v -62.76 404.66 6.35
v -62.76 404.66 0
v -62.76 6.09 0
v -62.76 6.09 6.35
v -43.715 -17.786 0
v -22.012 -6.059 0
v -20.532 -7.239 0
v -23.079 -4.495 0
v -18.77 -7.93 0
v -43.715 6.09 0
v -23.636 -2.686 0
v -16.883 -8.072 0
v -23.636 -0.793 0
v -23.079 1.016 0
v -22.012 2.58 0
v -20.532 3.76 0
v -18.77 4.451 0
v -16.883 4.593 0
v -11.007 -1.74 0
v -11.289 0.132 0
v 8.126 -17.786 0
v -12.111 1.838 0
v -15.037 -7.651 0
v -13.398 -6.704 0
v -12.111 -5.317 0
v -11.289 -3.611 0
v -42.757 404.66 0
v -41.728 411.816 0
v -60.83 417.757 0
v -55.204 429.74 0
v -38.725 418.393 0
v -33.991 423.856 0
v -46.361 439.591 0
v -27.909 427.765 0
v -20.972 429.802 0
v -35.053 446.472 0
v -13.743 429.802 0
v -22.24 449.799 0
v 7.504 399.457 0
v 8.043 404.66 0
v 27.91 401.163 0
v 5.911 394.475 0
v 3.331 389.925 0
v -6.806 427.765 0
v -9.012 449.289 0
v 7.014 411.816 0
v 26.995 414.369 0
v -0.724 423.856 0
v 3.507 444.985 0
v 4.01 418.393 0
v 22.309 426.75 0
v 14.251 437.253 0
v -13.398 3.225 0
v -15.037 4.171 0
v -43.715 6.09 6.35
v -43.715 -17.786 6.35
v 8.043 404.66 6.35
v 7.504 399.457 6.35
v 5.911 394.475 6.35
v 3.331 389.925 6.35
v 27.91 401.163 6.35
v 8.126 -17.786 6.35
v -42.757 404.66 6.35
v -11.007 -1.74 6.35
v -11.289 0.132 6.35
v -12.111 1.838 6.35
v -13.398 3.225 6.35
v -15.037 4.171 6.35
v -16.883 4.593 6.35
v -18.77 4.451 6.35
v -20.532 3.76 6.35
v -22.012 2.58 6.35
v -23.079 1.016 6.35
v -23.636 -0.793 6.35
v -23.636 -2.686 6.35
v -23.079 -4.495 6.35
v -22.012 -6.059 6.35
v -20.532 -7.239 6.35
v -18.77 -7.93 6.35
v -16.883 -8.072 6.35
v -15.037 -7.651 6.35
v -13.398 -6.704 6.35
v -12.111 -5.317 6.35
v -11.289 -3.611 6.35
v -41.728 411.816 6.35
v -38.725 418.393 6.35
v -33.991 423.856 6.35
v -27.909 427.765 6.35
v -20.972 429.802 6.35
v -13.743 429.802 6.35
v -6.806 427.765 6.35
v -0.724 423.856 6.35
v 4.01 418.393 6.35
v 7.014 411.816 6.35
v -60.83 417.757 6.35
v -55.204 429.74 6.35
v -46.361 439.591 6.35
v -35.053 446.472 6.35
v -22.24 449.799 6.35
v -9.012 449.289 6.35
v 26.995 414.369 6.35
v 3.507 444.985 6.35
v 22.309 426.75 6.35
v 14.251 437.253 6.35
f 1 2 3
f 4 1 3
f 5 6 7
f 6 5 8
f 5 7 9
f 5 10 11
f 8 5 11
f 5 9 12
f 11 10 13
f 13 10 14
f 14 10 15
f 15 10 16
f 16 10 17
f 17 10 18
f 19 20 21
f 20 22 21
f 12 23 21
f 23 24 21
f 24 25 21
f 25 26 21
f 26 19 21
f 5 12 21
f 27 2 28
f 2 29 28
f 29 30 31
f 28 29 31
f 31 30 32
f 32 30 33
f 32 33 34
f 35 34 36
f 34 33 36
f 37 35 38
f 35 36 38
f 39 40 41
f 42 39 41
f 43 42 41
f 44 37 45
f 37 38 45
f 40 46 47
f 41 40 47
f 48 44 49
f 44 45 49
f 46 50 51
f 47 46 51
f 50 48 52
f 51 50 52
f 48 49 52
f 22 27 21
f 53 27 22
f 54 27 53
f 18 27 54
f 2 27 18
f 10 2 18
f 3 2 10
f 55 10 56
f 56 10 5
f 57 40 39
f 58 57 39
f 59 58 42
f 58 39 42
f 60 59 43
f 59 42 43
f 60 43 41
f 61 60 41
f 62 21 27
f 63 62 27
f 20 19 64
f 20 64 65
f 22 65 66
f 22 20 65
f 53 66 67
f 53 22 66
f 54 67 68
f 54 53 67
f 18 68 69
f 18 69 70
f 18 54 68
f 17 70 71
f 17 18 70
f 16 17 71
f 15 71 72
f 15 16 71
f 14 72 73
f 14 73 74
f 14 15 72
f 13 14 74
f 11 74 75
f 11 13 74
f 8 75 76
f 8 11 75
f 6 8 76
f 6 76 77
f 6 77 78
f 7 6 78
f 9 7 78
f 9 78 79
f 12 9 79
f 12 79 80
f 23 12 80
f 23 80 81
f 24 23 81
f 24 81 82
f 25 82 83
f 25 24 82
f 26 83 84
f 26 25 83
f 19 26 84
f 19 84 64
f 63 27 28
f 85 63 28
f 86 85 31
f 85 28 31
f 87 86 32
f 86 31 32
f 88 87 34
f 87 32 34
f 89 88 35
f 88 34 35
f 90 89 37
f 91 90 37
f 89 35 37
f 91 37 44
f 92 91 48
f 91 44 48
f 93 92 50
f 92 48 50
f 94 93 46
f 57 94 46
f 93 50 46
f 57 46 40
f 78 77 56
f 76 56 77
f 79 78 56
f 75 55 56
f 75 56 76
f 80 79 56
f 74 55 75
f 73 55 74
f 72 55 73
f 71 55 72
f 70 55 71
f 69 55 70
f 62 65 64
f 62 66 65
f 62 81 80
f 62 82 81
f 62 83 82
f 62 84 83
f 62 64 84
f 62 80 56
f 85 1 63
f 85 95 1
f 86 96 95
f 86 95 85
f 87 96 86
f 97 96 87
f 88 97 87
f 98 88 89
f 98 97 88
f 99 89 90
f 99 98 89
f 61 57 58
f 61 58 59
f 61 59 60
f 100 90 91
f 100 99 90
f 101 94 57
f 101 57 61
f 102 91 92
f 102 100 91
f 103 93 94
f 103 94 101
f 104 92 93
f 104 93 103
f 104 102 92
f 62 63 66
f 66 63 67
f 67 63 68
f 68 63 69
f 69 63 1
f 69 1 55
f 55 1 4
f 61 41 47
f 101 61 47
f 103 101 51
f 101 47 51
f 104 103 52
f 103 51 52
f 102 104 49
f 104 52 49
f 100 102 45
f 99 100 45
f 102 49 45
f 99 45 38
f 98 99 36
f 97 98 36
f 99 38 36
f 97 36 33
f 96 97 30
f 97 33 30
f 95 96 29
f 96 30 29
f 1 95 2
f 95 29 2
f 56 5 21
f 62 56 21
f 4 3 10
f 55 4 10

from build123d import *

# Parameters (mm, degrees)
SKETCH1_R           = 6.35
BOSS_EXTRUDE1_DEPTH = 6.35


with BuildPart() as part:
    # Sketch1 → Boss-Extrude1 (new body)
    with BuildSketch(Plane.XY):
        with BuildLine():
            Line((3.331127109, 389.92455355), (27.90992579, 401.162728042))
            ThreePointArc((27.90992579, 401.162728042), (-15.607198263, 450.028916488), (-62.759573024, 404.660447113))
            Line((-62.759573024, 404.660447113), (-62.759573024, 6.090179643))
            Line((-62.759573024, 6.090179643), (-43.715258354, 6.090179643))
            Line((-43.715258354, 6.090179643), (-43.715258354, -17.785820357))
            Line((-43.715258354, -17.785820357), (8.125653236, -17.785820357))
            Line((8.125653236, -17.785820357), (-42.757358599, 404.660447113))
            ThreePointArc((-42.757358599, 404.660447113), (-17.357358599, 430.060447113), (8.042641401, 404.660447113))
            ThreePointArc((8.042641401, 404.660447113), (6.83610681, 396.925058855), (3.331127109, 389.92455355))
        make_face()
        with Locations((-17.357358599, -1.739552887)):
            Circle(SKETCH1_R, mode=Mode.SUBTRACT)
    extrude(amount=BOSS_EXTRUDE1_DEPTH)


solid = part.part
